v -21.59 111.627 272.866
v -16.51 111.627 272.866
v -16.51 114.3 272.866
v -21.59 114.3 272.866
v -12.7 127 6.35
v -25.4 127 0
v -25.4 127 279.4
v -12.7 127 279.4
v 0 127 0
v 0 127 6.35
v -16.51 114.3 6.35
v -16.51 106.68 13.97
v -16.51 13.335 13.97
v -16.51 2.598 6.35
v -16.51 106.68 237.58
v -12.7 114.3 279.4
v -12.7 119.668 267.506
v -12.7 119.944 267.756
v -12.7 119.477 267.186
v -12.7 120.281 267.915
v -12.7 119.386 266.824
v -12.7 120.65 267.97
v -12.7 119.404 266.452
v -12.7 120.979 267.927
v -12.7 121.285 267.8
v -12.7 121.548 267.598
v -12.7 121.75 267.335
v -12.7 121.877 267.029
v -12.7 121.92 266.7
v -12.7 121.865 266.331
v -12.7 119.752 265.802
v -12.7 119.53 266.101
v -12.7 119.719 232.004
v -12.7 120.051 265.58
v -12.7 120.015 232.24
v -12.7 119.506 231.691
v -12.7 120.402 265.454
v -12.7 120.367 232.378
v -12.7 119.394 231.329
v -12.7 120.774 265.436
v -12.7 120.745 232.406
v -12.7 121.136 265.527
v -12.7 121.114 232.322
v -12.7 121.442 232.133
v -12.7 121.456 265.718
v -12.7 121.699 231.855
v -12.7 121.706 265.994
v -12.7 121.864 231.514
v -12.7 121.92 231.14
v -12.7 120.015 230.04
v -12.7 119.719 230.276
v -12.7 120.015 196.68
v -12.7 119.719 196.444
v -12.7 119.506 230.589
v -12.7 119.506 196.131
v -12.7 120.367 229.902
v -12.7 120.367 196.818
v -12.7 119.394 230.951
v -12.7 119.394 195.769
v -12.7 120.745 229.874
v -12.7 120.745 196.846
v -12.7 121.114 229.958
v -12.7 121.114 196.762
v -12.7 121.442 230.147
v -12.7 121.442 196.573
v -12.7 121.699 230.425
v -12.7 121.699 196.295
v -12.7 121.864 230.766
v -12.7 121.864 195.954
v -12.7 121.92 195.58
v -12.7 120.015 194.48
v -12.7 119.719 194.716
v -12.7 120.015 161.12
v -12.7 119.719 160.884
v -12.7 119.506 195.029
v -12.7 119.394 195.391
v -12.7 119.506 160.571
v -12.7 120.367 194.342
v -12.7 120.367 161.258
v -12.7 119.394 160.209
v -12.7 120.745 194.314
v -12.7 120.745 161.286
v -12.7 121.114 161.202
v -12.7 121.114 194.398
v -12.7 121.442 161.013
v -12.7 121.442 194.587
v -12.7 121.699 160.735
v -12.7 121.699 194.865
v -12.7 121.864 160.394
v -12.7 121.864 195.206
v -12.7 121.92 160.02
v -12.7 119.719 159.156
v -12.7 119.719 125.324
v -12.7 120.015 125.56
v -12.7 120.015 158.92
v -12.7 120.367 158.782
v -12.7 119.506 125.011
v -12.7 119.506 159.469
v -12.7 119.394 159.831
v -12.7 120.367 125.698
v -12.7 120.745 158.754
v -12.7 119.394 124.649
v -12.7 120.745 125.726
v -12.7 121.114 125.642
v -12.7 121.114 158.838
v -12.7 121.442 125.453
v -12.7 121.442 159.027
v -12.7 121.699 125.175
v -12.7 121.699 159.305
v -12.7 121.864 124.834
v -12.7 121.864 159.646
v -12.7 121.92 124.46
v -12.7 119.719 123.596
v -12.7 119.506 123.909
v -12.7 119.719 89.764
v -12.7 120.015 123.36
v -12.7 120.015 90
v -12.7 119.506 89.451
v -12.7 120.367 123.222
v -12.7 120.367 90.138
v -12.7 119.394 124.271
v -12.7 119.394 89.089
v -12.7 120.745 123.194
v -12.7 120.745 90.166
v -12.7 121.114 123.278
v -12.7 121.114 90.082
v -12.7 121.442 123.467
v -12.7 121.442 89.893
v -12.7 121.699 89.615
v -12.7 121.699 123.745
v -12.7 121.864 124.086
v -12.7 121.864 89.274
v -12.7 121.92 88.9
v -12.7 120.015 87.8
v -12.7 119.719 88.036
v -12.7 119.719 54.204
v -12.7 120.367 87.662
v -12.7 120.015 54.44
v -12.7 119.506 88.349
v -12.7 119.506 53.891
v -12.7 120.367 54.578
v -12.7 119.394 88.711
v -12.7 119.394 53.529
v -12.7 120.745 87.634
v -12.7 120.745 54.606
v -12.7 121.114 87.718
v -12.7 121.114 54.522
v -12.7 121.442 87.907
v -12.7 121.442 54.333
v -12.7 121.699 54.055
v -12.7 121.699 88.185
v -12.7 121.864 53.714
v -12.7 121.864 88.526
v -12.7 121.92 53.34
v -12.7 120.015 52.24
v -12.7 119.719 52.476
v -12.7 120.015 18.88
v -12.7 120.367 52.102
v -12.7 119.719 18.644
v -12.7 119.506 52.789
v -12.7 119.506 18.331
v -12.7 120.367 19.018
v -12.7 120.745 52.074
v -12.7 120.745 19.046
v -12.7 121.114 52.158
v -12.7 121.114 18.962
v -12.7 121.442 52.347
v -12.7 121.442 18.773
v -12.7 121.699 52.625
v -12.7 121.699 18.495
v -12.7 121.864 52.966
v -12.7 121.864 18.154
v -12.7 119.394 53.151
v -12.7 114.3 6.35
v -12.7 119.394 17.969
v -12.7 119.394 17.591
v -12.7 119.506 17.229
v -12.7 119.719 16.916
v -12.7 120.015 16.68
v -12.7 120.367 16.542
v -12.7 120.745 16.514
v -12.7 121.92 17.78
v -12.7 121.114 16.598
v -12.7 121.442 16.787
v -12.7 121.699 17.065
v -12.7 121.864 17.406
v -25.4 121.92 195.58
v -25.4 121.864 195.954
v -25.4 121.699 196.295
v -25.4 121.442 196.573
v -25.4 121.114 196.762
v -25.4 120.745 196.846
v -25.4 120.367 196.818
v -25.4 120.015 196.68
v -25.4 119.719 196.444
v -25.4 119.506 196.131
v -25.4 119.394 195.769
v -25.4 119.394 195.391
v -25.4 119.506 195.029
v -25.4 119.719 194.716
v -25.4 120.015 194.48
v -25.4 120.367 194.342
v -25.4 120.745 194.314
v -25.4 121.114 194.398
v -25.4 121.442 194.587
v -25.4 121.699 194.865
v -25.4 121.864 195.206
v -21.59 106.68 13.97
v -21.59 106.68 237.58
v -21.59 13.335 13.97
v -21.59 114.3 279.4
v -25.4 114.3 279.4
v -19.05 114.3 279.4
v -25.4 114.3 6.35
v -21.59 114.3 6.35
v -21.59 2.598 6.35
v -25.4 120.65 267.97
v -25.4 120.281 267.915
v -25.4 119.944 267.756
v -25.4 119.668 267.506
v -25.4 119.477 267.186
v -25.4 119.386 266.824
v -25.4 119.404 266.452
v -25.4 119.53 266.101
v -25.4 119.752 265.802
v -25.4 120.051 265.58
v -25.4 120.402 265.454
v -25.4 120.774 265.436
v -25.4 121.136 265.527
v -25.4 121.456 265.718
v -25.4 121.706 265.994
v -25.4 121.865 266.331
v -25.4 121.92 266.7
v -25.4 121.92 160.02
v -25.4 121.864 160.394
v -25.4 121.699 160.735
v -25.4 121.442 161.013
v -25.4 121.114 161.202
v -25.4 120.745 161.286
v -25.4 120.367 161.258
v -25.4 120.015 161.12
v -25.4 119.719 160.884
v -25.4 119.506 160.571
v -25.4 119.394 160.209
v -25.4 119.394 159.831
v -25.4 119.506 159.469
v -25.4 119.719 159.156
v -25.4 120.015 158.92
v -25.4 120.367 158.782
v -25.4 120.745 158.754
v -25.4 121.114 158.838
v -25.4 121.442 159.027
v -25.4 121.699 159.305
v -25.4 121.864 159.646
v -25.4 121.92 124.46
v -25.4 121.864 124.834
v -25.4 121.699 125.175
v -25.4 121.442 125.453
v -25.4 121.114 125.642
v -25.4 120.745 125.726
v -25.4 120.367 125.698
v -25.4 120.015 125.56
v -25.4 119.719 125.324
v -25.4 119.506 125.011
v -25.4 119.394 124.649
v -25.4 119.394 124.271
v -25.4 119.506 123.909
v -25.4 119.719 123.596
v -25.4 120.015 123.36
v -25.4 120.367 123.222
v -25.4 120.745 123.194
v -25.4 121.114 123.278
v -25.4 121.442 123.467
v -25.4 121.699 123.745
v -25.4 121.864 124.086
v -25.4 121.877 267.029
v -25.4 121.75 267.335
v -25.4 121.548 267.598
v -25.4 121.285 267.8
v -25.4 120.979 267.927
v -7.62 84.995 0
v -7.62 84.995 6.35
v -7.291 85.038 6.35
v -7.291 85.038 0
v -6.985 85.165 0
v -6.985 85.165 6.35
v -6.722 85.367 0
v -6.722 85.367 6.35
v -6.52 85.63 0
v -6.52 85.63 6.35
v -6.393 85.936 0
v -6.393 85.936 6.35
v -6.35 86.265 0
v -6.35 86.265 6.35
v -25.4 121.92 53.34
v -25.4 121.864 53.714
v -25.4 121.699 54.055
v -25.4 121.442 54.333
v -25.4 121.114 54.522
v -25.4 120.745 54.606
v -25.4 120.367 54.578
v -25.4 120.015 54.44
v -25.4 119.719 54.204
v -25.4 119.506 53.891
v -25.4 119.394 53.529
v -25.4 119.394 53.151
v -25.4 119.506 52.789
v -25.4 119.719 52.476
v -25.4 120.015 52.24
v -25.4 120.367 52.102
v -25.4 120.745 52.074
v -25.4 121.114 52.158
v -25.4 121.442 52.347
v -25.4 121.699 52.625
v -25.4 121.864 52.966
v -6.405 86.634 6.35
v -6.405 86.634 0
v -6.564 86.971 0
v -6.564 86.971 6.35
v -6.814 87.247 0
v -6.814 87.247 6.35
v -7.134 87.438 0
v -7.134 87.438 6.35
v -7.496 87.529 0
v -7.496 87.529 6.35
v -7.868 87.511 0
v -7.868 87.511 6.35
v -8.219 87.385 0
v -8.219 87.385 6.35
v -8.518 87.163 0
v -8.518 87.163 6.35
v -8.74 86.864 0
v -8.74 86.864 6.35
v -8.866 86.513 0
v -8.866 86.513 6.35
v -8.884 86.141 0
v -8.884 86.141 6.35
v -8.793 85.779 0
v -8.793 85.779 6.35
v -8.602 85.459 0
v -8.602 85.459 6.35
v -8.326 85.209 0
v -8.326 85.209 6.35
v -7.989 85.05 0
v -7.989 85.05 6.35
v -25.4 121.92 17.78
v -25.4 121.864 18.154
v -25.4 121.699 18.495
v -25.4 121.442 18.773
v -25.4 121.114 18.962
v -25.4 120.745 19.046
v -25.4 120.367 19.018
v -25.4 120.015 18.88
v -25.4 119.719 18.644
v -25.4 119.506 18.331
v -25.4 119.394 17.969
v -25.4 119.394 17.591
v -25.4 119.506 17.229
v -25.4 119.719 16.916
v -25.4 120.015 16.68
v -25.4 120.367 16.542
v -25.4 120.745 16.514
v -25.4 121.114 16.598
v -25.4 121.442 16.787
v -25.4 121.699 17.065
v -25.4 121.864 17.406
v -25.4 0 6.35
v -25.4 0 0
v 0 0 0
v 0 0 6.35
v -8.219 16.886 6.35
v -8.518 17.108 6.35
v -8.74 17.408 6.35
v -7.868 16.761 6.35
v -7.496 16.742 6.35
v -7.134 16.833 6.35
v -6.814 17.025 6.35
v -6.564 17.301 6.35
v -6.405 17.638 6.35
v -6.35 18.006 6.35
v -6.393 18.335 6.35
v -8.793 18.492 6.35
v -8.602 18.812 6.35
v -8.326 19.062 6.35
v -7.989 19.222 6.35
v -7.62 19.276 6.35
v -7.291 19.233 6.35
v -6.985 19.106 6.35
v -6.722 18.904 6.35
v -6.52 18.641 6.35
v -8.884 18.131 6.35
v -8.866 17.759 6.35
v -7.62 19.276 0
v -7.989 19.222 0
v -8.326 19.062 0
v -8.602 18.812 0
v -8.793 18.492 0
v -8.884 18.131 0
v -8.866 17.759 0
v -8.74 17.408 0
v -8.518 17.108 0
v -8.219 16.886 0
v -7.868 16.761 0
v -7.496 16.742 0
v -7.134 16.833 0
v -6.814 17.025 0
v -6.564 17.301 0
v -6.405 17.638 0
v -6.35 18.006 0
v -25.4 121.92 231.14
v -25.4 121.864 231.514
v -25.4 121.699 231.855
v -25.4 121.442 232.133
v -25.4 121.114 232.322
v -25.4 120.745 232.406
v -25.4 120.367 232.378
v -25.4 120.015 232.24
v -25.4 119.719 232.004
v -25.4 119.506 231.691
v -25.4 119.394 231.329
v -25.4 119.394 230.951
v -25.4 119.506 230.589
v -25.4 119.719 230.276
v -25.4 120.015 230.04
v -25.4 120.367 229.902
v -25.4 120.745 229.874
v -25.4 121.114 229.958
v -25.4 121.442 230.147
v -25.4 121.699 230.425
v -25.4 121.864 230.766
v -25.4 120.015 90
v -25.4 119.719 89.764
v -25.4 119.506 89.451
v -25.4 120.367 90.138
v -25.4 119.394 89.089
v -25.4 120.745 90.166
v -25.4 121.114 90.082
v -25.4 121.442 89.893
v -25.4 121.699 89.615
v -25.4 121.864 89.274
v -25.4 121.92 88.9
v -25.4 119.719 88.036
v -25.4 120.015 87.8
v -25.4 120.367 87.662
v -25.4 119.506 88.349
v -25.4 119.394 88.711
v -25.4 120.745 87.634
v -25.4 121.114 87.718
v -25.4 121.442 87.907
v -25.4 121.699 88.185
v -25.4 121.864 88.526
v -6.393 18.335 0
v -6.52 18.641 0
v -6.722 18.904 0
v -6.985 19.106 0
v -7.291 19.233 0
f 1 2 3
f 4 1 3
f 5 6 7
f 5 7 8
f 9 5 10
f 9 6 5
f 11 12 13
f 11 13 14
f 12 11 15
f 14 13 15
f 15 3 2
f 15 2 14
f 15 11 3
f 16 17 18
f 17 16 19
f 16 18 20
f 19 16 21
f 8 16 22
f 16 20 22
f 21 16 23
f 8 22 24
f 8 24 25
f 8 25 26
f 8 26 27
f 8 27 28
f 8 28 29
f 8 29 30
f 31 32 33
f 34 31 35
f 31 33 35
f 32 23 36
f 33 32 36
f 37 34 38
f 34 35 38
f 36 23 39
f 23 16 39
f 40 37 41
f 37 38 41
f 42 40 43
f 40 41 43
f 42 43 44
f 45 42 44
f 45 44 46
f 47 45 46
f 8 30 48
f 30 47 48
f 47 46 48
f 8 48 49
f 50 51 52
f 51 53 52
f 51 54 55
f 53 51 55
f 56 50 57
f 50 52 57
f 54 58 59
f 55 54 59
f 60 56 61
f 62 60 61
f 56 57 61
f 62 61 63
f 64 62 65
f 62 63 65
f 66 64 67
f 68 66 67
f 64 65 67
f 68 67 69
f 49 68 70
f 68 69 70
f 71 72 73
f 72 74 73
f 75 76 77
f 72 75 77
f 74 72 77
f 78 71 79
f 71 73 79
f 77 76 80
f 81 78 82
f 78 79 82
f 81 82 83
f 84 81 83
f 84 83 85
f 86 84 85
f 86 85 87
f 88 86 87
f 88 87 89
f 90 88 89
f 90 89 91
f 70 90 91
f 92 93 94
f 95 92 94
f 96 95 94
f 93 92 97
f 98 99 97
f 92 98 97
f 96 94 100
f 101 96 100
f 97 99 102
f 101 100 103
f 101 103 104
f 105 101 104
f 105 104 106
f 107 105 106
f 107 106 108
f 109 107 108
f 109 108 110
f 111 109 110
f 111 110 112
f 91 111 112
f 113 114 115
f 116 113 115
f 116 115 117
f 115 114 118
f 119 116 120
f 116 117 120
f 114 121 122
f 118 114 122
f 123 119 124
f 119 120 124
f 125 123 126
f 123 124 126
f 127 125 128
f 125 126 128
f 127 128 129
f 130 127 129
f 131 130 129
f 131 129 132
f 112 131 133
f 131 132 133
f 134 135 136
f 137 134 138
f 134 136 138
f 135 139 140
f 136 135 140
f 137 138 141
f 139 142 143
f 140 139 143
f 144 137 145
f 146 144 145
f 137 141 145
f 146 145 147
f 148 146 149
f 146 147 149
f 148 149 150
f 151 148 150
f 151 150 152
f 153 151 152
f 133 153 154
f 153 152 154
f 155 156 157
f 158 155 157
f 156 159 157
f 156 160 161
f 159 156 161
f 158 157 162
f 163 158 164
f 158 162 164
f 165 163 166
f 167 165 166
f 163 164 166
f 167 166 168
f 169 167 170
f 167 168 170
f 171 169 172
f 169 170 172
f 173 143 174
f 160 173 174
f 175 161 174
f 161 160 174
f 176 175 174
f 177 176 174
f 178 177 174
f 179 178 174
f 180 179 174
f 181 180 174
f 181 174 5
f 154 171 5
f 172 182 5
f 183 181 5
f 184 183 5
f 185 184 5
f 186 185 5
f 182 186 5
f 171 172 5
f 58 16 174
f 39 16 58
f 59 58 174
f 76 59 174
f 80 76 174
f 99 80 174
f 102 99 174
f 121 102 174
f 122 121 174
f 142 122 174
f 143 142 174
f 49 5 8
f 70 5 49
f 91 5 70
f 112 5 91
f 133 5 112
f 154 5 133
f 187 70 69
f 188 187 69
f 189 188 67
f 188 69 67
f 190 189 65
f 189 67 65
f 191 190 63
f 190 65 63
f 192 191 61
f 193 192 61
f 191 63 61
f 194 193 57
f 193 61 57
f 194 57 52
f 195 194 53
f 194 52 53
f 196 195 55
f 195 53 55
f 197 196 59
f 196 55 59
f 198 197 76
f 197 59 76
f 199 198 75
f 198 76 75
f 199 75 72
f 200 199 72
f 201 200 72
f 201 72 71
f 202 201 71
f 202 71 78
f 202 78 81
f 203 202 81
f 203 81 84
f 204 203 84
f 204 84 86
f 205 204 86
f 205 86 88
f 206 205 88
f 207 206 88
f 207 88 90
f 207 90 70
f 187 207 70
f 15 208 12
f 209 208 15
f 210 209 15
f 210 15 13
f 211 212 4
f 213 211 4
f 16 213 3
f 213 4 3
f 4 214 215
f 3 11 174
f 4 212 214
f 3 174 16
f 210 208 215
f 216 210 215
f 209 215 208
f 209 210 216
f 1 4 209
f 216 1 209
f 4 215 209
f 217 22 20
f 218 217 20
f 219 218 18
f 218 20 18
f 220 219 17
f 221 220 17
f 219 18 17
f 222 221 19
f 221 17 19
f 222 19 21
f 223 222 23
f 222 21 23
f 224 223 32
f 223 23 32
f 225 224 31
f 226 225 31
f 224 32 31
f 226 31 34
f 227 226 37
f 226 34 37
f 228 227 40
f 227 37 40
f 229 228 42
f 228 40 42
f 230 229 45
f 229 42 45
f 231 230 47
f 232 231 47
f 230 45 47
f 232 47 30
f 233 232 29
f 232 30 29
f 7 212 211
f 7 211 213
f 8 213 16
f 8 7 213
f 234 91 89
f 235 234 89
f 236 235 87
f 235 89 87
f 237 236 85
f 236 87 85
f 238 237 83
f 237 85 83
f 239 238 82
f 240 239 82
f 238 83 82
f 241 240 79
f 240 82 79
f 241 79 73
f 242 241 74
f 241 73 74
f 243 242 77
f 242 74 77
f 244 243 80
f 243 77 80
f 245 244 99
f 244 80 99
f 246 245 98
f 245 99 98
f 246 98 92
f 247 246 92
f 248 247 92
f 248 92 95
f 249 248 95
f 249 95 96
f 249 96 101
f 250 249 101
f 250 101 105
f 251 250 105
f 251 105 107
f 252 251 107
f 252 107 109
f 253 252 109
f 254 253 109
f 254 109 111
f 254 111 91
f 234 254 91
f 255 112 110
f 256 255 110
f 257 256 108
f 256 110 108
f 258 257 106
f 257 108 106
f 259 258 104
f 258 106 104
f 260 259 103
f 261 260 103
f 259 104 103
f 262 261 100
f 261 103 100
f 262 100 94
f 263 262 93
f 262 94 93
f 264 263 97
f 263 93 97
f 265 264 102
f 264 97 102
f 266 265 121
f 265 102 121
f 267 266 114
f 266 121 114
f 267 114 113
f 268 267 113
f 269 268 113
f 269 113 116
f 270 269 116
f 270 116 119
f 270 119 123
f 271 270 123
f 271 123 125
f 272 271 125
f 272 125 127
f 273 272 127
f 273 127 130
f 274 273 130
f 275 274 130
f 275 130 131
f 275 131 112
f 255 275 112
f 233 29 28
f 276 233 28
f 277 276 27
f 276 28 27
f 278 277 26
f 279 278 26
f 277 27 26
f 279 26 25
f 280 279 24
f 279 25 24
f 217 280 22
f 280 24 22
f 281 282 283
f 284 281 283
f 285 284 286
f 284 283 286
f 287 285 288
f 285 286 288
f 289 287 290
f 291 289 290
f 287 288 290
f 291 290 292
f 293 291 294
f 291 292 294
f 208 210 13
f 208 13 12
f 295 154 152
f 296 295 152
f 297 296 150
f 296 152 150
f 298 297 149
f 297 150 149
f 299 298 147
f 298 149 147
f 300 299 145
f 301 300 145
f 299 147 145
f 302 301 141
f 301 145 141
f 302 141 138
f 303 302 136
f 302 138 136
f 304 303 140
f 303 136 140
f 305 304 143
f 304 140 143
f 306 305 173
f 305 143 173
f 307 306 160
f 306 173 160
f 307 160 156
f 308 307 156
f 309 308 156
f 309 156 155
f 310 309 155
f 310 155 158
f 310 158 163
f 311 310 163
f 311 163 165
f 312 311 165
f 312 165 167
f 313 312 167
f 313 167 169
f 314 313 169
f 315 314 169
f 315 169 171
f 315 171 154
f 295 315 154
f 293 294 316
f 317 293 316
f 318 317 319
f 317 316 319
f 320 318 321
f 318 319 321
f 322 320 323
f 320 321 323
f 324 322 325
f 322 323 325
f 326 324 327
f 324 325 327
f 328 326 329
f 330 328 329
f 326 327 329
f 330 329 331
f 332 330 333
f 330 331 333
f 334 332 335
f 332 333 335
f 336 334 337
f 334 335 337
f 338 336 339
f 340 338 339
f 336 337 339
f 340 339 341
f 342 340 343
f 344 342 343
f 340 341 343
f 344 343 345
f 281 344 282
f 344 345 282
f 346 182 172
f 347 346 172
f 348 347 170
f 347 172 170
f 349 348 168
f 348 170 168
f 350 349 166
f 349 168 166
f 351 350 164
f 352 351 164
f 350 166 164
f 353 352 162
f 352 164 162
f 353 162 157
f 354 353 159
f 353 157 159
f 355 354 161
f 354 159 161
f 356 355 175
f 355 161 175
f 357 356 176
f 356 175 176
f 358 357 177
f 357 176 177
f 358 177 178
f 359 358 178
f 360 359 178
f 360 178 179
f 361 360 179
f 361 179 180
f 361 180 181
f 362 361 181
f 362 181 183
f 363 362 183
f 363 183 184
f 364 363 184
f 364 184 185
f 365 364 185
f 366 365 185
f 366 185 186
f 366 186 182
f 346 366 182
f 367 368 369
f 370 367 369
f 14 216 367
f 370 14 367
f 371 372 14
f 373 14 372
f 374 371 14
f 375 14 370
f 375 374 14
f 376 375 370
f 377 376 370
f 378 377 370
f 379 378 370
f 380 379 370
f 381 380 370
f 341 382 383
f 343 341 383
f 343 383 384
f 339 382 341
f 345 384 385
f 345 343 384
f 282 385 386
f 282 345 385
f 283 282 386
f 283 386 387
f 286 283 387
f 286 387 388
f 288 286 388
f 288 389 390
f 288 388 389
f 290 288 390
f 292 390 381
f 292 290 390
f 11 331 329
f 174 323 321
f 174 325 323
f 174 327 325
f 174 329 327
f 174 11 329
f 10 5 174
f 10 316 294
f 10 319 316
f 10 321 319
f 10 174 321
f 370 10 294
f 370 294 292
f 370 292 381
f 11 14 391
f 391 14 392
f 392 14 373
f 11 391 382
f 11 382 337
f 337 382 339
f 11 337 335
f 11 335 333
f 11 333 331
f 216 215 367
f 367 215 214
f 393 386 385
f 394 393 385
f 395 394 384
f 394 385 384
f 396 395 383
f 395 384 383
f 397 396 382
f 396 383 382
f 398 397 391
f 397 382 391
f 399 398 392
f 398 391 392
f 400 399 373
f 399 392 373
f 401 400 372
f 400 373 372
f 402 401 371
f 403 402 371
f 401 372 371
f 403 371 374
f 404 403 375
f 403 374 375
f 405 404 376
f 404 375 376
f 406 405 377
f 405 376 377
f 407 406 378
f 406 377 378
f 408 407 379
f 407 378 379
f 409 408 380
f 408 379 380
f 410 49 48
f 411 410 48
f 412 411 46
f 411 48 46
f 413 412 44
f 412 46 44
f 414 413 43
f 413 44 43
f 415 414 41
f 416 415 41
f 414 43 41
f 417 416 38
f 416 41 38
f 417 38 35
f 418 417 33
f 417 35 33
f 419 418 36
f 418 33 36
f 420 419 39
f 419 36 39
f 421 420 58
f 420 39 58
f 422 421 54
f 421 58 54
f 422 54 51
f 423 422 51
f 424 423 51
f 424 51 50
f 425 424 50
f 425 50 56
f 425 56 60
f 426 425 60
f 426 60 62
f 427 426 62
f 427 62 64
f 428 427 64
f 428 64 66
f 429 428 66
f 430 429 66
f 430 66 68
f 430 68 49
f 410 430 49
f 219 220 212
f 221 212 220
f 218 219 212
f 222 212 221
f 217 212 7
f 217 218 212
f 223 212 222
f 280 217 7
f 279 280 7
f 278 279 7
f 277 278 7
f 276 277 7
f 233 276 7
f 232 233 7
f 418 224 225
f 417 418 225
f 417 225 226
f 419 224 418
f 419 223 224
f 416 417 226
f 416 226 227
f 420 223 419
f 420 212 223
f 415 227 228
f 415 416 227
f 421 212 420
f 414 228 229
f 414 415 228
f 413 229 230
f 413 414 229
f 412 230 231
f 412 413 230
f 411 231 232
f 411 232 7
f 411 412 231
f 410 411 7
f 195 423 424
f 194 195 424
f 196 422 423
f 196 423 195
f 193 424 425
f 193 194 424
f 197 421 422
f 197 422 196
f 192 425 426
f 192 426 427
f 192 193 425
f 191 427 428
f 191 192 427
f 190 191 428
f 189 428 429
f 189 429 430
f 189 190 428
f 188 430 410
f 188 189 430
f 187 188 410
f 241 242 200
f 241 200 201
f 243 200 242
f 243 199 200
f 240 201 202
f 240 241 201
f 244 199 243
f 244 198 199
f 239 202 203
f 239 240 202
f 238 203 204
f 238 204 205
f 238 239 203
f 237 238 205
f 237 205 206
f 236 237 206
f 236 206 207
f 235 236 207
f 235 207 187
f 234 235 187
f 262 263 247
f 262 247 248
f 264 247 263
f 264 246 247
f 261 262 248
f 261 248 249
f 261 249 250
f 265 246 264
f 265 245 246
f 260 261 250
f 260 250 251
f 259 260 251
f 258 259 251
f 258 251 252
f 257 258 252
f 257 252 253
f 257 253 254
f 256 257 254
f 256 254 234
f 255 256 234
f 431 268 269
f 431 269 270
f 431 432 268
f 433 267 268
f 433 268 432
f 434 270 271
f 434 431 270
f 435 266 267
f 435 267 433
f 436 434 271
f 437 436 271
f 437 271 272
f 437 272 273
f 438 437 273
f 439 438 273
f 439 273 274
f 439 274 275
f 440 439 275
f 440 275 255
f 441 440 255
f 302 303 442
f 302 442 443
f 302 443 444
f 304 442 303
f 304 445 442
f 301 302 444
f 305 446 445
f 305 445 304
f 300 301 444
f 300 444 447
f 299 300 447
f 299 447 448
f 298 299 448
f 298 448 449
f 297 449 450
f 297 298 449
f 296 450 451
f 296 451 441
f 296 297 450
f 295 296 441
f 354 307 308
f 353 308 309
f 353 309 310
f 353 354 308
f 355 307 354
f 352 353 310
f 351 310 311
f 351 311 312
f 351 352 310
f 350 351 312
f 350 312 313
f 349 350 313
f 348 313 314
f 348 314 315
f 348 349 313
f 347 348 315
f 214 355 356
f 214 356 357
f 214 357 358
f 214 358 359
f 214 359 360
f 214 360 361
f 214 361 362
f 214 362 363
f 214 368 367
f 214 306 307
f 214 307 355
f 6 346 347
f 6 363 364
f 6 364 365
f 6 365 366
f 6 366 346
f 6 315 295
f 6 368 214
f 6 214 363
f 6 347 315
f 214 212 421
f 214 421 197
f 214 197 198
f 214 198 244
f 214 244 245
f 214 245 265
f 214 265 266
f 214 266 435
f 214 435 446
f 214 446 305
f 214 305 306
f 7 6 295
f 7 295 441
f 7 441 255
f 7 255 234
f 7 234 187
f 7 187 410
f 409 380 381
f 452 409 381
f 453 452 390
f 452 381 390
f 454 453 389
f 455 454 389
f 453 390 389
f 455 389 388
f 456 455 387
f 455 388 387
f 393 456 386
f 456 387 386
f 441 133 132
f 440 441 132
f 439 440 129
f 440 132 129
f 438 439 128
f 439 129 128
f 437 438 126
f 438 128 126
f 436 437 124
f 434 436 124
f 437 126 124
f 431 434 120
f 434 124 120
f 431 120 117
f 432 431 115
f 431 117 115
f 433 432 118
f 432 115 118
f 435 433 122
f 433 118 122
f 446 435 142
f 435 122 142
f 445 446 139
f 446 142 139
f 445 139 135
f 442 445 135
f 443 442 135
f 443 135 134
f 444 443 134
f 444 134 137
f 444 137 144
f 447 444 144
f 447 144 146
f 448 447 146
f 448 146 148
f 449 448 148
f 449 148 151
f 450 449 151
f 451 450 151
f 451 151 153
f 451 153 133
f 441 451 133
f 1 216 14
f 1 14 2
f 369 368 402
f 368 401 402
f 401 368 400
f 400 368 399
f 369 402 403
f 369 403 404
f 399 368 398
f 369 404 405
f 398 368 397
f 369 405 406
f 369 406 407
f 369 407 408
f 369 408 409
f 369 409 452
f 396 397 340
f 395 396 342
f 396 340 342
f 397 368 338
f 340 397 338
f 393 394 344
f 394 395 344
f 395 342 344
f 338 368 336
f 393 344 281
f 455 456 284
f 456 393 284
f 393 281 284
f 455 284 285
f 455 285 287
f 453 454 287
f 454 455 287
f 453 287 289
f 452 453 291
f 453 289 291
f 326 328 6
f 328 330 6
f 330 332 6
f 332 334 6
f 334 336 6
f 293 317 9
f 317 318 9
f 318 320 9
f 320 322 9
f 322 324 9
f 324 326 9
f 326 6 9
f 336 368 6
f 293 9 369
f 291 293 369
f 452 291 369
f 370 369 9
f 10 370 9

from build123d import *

# Parameters (mm, degrees)
F0_W      = 25.4
F0_H      = 127
F1_DEPTH  = 6.35
F2_W      = 12.7
F2_H      = 12.7
F3_DEPTH  = 273.05
F4_W      = 2.54
F4_H      = 6.5340787411
F5_DEPTH  = 25.4
F7_DEPTH  = 5.08
F8_DEPTH  = 25.4
F10_DEPTH = 25.4
F11_R     = 1.27
F12_DEPTH = 25.4


with BuildPart() as f1:
    # F0 (on Top) → F1 (new body)
    with BuildSketch(Plane.XY):
        with Locations((-12.7, 63.5)):
            Rectangle(F0_W, F0_H)
    extrude(amount=F1_DEPTH)

    # F2 (on face) → F3 (join)
    with BuildSketch(Plane.XY.offset(6.35)):
        with Locations((-19.05, 120.65)):
            Rectangle(F2_W, F2_H)
    extrude(amount=F3_DEPTH)

    # F4 (on face) → F5 (join)
    with BuildSketch(Plane.XZ.offset(-114.3)):
        with Locations((-20.32, 276.1329606295)):
            Rectangle(F4_W, F4_H)
    extrude(amount=F5_DEPTH)

    # F6 (on face) → F7 (join)
    with BuildSketch(Plane(origin=(-21.59, 0, 0), x_dir=(0, -1, 0), z_dir=(-1, 0, 0))):
        Polygon((-13.335, 13.97), (-5.715, 13.97), (-111.6269677877, 272.8659212589), (-114.3, 272.8659212589), (-114.3, 263.1782591343), (-114.3, 6.35), (-106.68, 6.35), (-106.68, 13.97), (-106.68, 217.2529995441), (-106.68, 237.5801540886), align=None)
        Polygon((0, 0), (-5.715, 13.97), (-13.335, 13.97), (-106.68, 13.97), (-106.68, 6.35), (-114.3, 6.35), (-114.3, 0), (-96.3151082397, 0), align=None)
    extrude(amount=-F7_DEPTH)

    # F8 (cut): a face of the model
    f8_faces = [f1.faces().sort_by_distance(p)[0] for p in [
        (-20.32, 88.9, 276.1329606295),
    ]]
    extrude(f8_faces, amount=-F8_DEPTH, mode=Mode.SUBTRACT)

    # F9 (on face) → F10 (cut)
    with BuildSketch(Plane.XY.offset(6.35)):
        with BuildLine():
            ThreePointArc((-6.35, 86.2650498748), (-8.5180256121, 87.1630754869), (-7.62, 84.9950498748))
            ThreePointArc((-7.62, 84.9950498748), (-6.7219743879, 85.3670242627), (-6.35, 86.2650498748))
        make_face()
        with BuildLine():
            ThreePointArc((-7.62, 19.2763266307), (-8.5180256121, 17.1083010186), (-6.35, 18.0063266307))
            Line((-6.35, 18.0063266307), (-7.62, 18.0063266307))
            Line((-7.62, 18.0063266307), (-7.62, 19.2763266307))
        make_face()
        with BuildLine():
            Line((-7.62, 18.0063266307), (-6.35, 18.0063266307))
            ThreePointArc((-6.35, 18.0063266307), (-6.7219743879, 18.9043522428), (-7.62, 19.2763266307))
            Line((-7.62, 19.2763266307), (-7.62, 18.0063266307))
        make_face()
    extrude(amount=-F10_DEPTH, mode=Mode.SUBTRACT)

    # F11 (on face) → F12 (cut)
    with BuildSketch(Plane.YZ.offset(-12.7)):
        with BuildLine():
            ThreePointArc((121.92, 266.7), (121.5480256121, 267.5980256121), (120.65, 267.97))
            ThreePointArc((120.65, 267.97), (119.7519743879, 265.8019743879), (121.92, 266.7))
        make_face()
        with Locations((120.65, 231.14)):
            Circle(F11_R)
        with Locations((120.65, 195.58)):
            Circle(F11_R)
        with Locations((120.65, 160.02)):
            Circle(F11_R)
        with Locations((120.65, 124.46)):
            Circle(F11_R)
        with Locations((120.65, 88.9)):
            Circle(F11_R)
        with Locations((120.65, 53.34)):
            Circle(F11_R)
        with Locations((120.65, 17.78)):
            Circle(F11_R)
    extrude(amount=-F12_DEPTH, mode=Mode.SUBTRACT)


solid = f1.part
